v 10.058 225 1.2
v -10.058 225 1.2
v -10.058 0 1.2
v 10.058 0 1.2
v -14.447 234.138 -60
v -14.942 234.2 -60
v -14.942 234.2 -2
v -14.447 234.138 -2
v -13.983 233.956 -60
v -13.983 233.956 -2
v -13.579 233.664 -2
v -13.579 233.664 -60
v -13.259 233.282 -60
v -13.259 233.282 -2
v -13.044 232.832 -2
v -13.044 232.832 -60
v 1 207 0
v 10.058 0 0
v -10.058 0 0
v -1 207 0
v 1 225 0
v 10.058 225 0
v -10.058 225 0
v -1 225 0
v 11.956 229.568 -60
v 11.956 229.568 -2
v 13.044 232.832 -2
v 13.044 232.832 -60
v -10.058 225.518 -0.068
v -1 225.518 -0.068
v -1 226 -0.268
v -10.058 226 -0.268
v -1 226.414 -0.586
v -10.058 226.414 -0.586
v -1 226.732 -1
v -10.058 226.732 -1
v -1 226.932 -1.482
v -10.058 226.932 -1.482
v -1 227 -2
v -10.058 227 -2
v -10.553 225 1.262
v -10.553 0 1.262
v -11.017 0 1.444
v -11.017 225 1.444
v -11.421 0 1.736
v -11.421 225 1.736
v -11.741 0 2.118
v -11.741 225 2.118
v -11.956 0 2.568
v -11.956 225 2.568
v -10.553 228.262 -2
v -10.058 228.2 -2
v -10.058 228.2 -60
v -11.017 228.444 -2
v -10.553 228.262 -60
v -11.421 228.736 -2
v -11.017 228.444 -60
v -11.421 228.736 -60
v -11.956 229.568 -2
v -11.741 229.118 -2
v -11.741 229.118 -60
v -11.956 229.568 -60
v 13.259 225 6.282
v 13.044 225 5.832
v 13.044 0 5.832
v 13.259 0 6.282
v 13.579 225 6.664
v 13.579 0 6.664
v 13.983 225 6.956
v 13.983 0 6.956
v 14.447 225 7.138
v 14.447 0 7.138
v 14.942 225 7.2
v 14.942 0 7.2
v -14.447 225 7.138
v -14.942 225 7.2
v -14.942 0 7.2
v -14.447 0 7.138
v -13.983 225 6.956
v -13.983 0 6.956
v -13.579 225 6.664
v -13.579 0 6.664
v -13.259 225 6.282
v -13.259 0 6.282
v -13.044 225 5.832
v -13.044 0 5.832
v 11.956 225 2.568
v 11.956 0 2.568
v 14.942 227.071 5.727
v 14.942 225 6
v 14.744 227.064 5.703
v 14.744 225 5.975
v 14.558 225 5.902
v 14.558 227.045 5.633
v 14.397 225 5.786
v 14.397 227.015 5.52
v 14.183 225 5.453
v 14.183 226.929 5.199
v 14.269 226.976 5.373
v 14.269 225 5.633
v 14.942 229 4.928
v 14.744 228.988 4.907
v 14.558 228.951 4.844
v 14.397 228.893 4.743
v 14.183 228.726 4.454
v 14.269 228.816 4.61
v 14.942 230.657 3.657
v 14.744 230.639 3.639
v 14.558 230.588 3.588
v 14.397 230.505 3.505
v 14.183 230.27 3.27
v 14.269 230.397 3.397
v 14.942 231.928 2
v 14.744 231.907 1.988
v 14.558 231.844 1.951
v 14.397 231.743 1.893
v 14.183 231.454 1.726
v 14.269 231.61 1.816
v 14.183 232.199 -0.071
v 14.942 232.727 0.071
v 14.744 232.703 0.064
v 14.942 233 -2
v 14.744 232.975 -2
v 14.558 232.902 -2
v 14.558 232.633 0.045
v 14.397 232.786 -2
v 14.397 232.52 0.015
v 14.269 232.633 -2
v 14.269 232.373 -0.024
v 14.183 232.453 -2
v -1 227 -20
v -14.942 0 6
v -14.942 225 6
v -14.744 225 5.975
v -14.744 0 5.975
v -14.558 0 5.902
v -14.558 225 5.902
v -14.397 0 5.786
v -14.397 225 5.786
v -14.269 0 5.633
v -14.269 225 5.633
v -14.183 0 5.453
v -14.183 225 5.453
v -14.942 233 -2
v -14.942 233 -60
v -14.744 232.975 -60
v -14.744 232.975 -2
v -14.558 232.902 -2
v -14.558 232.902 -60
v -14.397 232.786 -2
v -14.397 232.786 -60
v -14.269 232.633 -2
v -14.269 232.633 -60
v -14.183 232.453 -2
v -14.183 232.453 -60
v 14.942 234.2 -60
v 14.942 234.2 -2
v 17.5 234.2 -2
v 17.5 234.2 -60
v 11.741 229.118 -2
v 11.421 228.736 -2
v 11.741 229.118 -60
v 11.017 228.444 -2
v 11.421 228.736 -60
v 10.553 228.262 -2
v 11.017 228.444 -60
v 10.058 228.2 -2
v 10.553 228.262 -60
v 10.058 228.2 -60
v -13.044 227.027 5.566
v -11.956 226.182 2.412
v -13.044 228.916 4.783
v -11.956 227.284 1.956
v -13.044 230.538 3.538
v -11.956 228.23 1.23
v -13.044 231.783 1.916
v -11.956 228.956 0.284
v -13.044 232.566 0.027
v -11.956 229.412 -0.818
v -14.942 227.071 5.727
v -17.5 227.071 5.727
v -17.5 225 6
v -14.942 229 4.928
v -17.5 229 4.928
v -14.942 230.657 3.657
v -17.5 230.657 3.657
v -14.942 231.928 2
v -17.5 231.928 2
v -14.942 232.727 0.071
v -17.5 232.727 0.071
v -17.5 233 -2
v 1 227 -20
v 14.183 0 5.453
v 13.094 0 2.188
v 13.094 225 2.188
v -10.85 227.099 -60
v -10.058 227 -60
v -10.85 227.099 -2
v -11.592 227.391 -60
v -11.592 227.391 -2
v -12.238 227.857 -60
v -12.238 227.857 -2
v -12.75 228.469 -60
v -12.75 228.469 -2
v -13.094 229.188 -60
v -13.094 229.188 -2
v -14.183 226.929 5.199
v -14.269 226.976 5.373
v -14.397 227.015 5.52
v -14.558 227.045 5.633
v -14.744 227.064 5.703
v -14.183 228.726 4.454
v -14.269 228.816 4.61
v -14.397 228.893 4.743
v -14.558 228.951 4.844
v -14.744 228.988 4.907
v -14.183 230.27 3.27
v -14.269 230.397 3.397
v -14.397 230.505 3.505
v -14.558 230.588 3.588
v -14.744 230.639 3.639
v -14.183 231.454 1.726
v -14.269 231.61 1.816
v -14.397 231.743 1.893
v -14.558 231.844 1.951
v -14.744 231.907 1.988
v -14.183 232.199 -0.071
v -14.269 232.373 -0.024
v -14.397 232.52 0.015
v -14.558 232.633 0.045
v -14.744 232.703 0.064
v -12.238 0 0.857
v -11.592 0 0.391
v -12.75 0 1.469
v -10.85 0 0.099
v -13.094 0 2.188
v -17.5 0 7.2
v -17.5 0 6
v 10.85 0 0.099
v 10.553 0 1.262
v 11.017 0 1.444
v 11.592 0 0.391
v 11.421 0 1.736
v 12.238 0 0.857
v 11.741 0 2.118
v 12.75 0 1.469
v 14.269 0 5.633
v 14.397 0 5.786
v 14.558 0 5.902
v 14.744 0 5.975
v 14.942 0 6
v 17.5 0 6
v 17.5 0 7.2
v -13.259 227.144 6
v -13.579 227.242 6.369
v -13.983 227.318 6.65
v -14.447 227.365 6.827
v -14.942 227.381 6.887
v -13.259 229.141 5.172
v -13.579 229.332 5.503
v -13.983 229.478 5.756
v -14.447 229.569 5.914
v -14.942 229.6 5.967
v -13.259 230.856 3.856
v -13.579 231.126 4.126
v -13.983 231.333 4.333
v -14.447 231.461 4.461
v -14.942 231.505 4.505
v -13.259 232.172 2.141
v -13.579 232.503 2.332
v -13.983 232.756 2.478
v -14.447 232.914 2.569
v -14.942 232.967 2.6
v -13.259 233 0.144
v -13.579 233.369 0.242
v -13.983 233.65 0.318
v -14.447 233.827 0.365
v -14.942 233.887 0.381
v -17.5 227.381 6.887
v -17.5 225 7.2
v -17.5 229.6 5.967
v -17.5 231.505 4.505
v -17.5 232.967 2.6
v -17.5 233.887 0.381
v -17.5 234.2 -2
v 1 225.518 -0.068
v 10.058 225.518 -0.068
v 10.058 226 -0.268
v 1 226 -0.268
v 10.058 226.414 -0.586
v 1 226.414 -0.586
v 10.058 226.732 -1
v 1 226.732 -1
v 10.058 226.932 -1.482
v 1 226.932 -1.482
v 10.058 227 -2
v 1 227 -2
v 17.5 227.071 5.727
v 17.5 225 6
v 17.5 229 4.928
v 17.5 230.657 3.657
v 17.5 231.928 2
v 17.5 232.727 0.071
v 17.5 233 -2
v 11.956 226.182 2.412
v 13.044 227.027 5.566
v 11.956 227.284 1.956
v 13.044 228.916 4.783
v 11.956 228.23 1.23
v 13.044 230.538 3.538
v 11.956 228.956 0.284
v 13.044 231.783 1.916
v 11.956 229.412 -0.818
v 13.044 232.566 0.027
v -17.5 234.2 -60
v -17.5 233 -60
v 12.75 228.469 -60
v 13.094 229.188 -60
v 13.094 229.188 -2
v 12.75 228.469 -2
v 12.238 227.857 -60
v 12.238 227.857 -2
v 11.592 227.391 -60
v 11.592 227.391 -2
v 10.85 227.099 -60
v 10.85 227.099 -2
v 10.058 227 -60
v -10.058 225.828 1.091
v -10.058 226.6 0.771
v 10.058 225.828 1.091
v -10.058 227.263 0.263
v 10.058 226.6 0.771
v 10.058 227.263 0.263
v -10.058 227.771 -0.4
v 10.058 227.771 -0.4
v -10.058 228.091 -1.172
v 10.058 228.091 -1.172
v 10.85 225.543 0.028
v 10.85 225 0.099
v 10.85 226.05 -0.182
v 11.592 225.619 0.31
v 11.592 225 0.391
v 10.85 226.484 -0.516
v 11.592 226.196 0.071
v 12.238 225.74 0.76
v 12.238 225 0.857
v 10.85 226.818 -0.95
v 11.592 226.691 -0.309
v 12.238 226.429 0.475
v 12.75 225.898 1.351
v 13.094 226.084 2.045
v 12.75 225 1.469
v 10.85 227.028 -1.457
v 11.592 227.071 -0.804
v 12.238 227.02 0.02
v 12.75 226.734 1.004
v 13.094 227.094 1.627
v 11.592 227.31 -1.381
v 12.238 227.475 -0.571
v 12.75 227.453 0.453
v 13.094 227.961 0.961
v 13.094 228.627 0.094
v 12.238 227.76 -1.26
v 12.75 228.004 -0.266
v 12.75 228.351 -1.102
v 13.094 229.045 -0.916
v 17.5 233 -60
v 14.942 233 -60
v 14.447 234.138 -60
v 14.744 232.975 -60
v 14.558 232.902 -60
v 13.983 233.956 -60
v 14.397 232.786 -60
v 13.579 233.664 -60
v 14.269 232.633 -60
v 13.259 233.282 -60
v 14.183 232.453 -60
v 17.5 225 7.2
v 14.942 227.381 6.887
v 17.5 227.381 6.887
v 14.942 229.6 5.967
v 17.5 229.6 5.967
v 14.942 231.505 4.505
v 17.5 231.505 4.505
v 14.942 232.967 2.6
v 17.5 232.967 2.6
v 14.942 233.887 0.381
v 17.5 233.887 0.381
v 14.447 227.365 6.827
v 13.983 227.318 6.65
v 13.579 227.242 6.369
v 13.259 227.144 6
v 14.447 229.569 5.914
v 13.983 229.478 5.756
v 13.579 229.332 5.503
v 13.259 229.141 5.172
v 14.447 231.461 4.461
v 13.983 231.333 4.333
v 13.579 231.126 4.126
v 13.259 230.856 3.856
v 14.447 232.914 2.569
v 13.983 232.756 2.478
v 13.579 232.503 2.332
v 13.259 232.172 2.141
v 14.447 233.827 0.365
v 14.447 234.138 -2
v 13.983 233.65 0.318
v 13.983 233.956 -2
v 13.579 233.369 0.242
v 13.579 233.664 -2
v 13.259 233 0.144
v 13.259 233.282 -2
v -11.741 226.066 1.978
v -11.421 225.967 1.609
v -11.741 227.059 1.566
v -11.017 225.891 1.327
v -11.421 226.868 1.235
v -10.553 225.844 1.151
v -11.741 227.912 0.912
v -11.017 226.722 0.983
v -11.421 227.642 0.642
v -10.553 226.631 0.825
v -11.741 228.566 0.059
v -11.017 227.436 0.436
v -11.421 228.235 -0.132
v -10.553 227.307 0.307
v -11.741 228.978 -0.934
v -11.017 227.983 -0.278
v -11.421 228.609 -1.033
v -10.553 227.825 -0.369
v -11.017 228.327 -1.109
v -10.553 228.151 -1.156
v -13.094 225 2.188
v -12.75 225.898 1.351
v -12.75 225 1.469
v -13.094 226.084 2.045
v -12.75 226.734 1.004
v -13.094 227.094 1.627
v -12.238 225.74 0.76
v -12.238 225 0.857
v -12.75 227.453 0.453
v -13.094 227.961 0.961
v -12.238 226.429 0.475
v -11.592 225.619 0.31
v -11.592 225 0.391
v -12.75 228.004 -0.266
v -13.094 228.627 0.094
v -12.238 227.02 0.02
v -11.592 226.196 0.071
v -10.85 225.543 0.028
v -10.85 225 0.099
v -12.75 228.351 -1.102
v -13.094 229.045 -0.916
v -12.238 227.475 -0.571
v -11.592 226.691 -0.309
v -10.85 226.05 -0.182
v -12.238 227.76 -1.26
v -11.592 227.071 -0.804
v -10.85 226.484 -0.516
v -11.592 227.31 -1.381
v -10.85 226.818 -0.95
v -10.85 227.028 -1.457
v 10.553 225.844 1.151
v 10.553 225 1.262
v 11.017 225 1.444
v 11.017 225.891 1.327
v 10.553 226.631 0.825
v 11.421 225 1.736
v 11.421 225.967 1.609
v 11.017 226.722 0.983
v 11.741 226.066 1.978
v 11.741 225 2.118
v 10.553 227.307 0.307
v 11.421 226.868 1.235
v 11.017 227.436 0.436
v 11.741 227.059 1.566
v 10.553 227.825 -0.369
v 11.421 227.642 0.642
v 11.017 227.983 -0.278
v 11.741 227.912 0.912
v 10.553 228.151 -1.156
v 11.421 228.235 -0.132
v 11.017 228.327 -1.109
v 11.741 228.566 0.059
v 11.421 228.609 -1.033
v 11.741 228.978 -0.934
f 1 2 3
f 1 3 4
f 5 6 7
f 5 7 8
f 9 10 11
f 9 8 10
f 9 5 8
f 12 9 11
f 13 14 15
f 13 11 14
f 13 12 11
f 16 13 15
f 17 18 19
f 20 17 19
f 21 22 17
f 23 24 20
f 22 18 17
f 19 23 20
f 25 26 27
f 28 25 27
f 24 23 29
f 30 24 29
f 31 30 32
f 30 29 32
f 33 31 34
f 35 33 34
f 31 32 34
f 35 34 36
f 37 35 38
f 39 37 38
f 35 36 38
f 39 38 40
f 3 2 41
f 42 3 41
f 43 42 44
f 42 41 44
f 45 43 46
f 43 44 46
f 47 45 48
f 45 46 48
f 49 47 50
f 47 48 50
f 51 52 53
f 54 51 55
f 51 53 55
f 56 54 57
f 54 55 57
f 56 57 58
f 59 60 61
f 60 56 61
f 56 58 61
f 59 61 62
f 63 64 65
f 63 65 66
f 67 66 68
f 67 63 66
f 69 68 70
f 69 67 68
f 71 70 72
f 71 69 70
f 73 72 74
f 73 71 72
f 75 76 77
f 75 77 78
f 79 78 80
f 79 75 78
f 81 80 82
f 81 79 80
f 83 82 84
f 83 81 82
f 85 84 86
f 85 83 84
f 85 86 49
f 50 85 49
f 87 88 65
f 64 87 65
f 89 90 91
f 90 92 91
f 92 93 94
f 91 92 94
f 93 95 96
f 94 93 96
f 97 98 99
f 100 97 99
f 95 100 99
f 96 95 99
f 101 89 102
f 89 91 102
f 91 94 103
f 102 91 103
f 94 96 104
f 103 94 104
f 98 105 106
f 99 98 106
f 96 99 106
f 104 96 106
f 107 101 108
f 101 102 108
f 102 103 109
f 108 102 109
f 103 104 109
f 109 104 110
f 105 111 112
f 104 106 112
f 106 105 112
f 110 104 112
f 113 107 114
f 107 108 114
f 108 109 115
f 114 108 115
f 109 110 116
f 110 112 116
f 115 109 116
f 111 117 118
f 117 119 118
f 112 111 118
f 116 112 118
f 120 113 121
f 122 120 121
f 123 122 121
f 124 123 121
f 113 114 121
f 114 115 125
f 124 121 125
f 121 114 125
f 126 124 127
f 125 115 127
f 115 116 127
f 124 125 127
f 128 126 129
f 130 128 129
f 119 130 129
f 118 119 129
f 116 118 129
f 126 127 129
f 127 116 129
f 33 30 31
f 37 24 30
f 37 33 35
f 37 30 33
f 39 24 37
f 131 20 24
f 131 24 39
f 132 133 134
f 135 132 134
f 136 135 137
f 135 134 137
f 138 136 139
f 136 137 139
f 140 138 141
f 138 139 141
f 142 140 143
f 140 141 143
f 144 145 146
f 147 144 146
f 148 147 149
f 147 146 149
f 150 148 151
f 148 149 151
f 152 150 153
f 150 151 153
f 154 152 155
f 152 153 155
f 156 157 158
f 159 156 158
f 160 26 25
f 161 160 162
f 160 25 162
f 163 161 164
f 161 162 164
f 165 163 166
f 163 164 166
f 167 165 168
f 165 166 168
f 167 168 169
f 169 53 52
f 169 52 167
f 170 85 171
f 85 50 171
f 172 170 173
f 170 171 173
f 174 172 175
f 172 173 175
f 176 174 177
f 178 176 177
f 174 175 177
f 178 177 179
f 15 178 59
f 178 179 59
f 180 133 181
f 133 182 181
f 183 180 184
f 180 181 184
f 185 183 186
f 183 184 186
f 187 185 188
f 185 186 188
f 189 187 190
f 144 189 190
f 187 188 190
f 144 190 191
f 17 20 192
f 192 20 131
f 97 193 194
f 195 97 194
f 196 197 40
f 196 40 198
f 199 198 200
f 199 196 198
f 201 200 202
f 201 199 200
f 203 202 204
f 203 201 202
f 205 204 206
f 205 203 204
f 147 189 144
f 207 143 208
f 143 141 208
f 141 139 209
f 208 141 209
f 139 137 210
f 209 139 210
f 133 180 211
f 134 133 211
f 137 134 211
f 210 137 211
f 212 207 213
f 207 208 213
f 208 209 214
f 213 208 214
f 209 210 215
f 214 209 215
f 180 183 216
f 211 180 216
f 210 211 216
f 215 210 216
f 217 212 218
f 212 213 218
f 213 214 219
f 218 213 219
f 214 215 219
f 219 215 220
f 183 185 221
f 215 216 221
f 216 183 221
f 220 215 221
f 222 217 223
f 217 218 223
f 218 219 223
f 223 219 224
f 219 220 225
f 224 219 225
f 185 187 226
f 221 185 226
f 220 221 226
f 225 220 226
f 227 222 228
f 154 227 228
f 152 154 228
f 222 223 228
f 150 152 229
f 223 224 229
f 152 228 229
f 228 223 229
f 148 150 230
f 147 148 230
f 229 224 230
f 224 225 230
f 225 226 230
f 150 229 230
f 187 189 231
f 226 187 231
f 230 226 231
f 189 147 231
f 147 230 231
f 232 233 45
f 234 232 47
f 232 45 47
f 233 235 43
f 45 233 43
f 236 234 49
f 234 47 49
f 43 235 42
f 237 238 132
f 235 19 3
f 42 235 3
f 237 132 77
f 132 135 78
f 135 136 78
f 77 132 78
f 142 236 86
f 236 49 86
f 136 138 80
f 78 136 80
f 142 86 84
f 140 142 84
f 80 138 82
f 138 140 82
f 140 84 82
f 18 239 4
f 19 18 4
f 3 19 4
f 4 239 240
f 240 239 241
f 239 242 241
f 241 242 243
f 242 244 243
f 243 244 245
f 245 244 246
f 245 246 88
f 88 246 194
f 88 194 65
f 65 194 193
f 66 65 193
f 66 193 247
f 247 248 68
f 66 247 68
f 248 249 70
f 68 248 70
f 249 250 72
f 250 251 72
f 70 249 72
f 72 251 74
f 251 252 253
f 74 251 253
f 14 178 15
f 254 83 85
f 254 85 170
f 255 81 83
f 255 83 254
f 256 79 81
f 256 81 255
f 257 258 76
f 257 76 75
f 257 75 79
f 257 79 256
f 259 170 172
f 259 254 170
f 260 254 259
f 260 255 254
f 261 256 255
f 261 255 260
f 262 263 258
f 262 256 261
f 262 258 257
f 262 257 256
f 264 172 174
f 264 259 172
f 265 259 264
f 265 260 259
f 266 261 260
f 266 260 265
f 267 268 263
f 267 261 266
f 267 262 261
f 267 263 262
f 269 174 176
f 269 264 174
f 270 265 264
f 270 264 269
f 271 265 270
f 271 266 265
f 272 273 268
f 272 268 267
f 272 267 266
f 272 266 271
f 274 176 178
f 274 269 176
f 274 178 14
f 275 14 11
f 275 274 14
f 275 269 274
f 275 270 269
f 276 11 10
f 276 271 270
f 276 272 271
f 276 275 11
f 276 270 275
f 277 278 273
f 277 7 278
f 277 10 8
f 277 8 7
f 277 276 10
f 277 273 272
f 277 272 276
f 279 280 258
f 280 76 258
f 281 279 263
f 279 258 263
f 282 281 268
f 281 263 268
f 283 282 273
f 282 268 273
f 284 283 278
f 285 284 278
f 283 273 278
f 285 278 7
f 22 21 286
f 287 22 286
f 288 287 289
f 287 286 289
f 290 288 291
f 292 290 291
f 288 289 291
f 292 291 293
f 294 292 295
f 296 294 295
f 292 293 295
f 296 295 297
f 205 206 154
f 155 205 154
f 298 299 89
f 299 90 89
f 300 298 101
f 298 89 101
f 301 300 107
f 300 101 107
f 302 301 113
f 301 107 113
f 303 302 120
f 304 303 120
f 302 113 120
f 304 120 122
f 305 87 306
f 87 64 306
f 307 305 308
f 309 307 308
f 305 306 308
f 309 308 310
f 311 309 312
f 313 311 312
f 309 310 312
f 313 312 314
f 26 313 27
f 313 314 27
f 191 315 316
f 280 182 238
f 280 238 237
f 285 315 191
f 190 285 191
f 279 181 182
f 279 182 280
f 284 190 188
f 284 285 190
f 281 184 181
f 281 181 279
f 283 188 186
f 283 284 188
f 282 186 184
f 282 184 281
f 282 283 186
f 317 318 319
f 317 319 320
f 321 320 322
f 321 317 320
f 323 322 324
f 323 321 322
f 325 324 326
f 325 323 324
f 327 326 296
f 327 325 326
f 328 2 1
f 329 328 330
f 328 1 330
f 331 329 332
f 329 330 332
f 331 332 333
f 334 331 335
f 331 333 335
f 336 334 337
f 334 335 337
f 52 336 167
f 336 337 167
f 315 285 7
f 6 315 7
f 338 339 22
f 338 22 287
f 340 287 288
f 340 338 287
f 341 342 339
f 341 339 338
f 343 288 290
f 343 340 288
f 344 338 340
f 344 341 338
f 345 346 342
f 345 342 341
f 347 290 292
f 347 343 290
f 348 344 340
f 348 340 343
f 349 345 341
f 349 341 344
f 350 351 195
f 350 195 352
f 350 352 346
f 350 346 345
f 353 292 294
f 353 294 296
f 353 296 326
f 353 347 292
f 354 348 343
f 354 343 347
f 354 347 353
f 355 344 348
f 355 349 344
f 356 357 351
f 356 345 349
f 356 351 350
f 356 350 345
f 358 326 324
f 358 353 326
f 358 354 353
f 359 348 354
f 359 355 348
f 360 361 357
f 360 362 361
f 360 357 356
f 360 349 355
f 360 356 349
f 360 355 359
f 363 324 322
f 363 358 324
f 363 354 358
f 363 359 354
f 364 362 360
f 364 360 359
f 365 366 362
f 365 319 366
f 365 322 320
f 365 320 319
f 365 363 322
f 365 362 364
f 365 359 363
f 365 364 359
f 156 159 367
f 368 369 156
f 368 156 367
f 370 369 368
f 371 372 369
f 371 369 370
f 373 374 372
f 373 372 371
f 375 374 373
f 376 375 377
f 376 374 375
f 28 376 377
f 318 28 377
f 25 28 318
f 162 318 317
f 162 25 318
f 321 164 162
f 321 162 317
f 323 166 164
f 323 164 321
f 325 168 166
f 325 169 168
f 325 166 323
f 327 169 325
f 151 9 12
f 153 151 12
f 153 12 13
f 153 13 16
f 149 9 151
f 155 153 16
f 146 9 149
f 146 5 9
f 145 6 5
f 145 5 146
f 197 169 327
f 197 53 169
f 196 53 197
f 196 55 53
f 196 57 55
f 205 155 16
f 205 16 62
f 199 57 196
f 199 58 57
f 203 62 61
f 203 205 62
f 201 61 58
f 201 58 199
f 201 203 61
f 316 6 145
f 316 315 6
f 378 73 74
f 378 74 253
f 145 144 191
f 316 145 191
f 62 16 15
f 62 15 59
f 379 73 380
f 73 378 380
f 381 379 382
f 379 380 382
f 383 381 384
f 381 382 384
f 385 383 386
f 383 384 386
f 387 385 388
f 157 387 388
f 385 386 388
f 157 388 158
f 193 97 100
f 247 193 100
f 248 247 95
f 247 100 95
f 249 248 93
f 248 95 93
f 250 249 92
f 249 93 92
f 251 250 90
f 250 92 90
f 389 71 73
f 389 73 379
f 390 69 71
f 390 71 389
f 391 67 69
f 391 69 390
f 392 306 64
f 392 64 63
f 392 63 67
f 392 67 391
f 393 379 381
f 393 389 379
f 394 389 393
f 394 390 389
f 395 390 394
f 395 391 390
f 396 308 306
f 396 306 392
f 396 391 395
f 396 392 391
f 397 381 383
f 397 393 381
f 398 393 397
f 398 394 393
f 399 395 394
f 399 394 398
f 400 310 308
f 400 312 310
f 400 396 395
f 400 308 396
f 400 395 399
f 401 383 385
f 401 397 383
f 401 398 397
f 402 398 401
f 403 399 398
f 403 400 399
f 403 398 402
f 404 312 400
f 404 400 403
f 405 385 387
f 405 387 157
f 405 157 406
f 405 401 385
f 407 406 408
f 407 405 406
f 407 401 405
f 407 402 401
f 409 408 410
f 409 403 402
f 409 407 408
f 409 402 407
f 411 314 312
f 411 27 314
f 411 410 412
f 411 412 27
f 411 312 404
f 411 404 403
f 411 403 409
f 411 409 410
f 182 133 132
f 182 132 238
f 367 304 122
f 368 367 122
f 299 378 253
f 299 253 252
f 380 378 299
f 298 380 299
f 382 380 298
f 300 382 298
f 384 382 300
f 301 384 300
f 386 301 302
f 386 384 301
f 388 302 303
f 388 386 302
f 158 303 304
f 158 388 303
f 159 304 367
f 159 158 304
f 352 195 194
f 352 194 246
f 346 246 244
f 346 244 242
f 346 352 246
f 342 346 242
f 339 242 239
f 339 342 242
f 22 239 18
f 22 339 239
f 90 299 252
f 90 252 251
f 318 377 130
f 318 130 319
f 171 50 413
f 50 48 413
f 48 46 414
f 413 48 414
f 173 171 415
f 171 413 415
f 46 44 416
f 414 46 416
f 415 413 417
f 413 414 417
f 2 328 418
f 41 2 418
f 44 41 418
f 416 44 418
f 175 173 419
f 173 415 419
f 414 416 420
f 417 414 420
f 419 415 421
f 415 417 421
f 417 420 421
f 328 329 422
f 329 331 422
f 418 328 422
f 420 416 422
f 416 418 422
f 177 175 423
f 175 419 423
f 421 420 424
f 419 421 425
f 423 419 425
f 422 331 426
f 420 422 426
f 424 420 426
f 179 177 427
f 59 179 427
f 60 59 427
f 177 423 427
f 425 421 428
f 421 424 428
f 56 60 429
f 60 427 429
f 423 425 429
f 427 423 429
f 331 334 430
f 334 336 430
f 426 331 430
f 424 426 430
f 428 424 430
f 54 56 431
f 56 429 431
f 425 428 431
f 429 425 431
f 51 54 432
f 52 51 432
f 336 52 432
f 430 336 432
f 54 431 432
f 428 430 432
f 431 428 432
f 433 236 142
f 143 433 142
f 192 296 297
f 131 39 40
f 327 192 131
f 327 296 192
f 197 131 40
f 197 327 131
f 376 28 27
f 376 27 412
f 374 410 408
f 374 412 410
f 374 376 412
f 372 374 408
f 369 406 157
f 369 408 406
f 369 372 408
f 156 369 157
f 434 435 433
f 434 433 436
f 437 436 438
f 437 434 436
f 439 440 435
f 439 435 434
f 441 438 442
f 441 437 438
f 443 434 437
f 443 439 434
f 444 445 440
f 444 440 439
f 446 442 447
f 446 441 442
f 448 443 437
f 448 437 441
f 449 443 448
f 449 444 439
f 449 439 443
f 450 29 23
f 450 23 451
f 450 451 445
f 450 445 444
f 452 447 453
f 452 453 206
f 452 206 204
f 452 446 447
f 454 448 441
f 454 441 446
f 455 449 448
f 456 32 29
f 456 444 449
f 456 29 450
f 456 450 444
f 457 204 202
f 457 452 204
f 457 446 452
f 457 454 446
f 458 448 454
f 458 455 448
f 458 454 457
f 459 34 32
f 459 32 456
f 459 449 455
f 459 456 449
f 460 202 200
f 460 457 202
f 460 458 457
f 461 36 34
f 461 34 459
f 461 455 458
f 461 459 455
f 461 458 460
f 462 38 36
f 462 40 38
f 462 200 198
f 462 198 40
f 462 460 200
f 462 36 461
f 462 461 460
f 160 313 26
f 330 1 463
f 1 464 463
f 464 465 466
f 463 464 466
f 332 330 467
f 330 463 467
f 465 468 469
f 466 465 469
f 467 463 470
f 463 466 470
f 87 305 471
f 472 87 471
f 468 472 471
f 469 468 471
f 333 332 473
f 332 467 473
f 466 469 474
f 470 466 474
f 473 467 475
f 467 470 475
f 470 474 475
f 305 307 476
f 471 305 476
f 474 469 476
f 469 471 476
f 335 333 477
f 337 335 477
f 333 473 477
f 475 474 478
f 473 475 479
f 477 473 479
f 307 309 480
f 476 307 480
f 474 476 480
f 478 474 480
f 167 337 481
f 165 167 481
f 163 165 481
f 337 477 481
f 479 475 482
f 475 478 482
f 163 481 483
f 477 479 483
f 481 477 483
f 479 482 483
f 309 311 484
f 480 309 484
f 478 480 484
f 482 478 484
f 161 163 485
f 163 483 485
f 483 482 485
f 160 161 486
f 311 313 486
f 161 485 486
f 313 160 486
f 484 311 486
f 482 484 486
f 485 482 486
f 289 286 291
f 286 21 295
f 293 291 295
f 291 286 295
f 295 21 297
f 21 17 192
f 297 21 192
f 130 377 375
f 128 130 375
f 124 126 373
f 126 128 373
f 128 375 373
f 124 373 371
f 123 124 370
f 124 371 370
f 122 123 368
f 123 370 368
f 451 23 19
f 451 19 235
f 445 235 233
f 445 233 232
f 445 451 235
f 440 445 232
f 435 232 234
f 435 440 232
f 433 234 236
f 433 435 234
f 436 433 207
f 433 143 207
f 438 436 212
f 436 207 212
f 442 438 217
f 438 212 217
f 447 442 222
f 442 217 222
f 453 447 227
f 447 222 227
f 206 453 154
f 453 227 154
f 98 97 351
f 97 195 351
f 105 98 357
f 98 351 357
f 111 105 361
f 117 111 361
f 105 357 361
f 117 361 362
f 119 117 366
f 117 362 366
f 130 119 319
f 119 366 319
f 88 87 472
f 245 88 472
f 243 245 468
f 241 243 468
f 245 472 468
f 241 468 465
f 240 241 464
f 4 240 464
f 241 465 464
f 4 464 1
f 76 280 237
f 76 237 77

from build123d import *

# Parameters (mm, degrees)
RIB_3_REACH     = 244.396
SKETCH_3_WALL_W = 515.076556858
SKETCH_3_WALL_H = 2


with BuildPart() as part:
    # 扫描1: sweep along a path in 草图2
    with BuildLine(Plane(origin=(0, 0, 0), x_dir=(0, 0, -1), z_dir=(1, 0, 0))) as sweep_1_path:
        Line((0, 0), (0, 225))
        ThreePointArc((0, 225), (0.585786438, 226.414213562), (2, 227))
        Line((2, 227), (60, 227))
    # 草图1 → 扫描1 (sweep)
    with BuildSketch(Plane(origin=(0, 0, 0), x_dir=(1, 0, 0), z_dir=(0, 1, 0))):
        with BuildLine():
            Line((17.5, -7.2), (14.94151844, -7.2))
            ThreePointArc((14.94151844, -7.2), (13.772097871, -6.82248437), (13.044151844, -5.832455532))
            Line((13.044151844, -5.832455532), (11.955848156, -2.567544468))
            ThreePointArc((11.955848156, -2.567544468), (11.227902129, -1.57751563), (10.05848156, -1.2))
            Line((10.05848156, -1.2), (-10.05848156, -1.2))
            ThreePointArc((-10.05848156, -1.2), (-11.227902129, -1.57751563), (-11.955848156, -2.567544468))
            Line((-11.955848156, -2.567544468), (-13.044151844, -5.832455532))
            ThreePointArc((-13.044151844, -5.832455532), (-13.772097871, -6.82248437), (-14.94151844, -7.2))
            Line((-14.94151844, -7.2), (-17.5, -7.2))
            Line((-17.5, -7.2), (-17.5, -6))
            Line((-17.5, -6), (-14.94151844, -6))
            ThreePointArc((-14.94151844, -6), (-14.473750212, -5.848993748), (-14.182571802, -5.452982213))
            Line((-14.182571802, -5.452982213), (-13.094268114, -2.188071149))
            ThreePointArc((-13.094268114, -2.188071149), (-11.929554471, -0.604025007), (-10.05848156, 0))
            Line((-10.05848156, 0), (10.05848156, 0))
            ThreePointArc((10.05848156, 0), (11.929554471, -0.604025007), (13.094268114, -2.188071149))
            Line((13.094268114, -2.188071149), (14.182571802, -5.452982213))
            ThreePointArc((14.182571802, -5.452982213), (14.473750212, -5.848993748), (14.94151844, -6))
            Line((14.94151844, -6), (17.5, -6))
            Line((17.5, -6), (17.5, -7.2))
        make_face()
    sweep(path=sweep_1_path.line)

    # 草图3 wall → 筋3 (add, up to next)
    with BuildSketch(Plane(origin=(0, 217, -10), x_dir=(0, 0.707106781187, -0.707106781187), z_dir=(0, 0.707106781187, 0.707106781187)), mode=Mode.PRIVATE) as rib_3_sk1:
        Rectangle(SKETCH_3_WALL_W, SKETCH_3_WALL_H)
    rib_3_tool1 = extrude(rib_3_sk1.sketch, amount=RIB_3_REACH, mode=Mode.PRIVATE) - part.part
    add(rib_3_tool1.solids().sort_by_distance((0, 217, -10))[0])


solid = part.part
